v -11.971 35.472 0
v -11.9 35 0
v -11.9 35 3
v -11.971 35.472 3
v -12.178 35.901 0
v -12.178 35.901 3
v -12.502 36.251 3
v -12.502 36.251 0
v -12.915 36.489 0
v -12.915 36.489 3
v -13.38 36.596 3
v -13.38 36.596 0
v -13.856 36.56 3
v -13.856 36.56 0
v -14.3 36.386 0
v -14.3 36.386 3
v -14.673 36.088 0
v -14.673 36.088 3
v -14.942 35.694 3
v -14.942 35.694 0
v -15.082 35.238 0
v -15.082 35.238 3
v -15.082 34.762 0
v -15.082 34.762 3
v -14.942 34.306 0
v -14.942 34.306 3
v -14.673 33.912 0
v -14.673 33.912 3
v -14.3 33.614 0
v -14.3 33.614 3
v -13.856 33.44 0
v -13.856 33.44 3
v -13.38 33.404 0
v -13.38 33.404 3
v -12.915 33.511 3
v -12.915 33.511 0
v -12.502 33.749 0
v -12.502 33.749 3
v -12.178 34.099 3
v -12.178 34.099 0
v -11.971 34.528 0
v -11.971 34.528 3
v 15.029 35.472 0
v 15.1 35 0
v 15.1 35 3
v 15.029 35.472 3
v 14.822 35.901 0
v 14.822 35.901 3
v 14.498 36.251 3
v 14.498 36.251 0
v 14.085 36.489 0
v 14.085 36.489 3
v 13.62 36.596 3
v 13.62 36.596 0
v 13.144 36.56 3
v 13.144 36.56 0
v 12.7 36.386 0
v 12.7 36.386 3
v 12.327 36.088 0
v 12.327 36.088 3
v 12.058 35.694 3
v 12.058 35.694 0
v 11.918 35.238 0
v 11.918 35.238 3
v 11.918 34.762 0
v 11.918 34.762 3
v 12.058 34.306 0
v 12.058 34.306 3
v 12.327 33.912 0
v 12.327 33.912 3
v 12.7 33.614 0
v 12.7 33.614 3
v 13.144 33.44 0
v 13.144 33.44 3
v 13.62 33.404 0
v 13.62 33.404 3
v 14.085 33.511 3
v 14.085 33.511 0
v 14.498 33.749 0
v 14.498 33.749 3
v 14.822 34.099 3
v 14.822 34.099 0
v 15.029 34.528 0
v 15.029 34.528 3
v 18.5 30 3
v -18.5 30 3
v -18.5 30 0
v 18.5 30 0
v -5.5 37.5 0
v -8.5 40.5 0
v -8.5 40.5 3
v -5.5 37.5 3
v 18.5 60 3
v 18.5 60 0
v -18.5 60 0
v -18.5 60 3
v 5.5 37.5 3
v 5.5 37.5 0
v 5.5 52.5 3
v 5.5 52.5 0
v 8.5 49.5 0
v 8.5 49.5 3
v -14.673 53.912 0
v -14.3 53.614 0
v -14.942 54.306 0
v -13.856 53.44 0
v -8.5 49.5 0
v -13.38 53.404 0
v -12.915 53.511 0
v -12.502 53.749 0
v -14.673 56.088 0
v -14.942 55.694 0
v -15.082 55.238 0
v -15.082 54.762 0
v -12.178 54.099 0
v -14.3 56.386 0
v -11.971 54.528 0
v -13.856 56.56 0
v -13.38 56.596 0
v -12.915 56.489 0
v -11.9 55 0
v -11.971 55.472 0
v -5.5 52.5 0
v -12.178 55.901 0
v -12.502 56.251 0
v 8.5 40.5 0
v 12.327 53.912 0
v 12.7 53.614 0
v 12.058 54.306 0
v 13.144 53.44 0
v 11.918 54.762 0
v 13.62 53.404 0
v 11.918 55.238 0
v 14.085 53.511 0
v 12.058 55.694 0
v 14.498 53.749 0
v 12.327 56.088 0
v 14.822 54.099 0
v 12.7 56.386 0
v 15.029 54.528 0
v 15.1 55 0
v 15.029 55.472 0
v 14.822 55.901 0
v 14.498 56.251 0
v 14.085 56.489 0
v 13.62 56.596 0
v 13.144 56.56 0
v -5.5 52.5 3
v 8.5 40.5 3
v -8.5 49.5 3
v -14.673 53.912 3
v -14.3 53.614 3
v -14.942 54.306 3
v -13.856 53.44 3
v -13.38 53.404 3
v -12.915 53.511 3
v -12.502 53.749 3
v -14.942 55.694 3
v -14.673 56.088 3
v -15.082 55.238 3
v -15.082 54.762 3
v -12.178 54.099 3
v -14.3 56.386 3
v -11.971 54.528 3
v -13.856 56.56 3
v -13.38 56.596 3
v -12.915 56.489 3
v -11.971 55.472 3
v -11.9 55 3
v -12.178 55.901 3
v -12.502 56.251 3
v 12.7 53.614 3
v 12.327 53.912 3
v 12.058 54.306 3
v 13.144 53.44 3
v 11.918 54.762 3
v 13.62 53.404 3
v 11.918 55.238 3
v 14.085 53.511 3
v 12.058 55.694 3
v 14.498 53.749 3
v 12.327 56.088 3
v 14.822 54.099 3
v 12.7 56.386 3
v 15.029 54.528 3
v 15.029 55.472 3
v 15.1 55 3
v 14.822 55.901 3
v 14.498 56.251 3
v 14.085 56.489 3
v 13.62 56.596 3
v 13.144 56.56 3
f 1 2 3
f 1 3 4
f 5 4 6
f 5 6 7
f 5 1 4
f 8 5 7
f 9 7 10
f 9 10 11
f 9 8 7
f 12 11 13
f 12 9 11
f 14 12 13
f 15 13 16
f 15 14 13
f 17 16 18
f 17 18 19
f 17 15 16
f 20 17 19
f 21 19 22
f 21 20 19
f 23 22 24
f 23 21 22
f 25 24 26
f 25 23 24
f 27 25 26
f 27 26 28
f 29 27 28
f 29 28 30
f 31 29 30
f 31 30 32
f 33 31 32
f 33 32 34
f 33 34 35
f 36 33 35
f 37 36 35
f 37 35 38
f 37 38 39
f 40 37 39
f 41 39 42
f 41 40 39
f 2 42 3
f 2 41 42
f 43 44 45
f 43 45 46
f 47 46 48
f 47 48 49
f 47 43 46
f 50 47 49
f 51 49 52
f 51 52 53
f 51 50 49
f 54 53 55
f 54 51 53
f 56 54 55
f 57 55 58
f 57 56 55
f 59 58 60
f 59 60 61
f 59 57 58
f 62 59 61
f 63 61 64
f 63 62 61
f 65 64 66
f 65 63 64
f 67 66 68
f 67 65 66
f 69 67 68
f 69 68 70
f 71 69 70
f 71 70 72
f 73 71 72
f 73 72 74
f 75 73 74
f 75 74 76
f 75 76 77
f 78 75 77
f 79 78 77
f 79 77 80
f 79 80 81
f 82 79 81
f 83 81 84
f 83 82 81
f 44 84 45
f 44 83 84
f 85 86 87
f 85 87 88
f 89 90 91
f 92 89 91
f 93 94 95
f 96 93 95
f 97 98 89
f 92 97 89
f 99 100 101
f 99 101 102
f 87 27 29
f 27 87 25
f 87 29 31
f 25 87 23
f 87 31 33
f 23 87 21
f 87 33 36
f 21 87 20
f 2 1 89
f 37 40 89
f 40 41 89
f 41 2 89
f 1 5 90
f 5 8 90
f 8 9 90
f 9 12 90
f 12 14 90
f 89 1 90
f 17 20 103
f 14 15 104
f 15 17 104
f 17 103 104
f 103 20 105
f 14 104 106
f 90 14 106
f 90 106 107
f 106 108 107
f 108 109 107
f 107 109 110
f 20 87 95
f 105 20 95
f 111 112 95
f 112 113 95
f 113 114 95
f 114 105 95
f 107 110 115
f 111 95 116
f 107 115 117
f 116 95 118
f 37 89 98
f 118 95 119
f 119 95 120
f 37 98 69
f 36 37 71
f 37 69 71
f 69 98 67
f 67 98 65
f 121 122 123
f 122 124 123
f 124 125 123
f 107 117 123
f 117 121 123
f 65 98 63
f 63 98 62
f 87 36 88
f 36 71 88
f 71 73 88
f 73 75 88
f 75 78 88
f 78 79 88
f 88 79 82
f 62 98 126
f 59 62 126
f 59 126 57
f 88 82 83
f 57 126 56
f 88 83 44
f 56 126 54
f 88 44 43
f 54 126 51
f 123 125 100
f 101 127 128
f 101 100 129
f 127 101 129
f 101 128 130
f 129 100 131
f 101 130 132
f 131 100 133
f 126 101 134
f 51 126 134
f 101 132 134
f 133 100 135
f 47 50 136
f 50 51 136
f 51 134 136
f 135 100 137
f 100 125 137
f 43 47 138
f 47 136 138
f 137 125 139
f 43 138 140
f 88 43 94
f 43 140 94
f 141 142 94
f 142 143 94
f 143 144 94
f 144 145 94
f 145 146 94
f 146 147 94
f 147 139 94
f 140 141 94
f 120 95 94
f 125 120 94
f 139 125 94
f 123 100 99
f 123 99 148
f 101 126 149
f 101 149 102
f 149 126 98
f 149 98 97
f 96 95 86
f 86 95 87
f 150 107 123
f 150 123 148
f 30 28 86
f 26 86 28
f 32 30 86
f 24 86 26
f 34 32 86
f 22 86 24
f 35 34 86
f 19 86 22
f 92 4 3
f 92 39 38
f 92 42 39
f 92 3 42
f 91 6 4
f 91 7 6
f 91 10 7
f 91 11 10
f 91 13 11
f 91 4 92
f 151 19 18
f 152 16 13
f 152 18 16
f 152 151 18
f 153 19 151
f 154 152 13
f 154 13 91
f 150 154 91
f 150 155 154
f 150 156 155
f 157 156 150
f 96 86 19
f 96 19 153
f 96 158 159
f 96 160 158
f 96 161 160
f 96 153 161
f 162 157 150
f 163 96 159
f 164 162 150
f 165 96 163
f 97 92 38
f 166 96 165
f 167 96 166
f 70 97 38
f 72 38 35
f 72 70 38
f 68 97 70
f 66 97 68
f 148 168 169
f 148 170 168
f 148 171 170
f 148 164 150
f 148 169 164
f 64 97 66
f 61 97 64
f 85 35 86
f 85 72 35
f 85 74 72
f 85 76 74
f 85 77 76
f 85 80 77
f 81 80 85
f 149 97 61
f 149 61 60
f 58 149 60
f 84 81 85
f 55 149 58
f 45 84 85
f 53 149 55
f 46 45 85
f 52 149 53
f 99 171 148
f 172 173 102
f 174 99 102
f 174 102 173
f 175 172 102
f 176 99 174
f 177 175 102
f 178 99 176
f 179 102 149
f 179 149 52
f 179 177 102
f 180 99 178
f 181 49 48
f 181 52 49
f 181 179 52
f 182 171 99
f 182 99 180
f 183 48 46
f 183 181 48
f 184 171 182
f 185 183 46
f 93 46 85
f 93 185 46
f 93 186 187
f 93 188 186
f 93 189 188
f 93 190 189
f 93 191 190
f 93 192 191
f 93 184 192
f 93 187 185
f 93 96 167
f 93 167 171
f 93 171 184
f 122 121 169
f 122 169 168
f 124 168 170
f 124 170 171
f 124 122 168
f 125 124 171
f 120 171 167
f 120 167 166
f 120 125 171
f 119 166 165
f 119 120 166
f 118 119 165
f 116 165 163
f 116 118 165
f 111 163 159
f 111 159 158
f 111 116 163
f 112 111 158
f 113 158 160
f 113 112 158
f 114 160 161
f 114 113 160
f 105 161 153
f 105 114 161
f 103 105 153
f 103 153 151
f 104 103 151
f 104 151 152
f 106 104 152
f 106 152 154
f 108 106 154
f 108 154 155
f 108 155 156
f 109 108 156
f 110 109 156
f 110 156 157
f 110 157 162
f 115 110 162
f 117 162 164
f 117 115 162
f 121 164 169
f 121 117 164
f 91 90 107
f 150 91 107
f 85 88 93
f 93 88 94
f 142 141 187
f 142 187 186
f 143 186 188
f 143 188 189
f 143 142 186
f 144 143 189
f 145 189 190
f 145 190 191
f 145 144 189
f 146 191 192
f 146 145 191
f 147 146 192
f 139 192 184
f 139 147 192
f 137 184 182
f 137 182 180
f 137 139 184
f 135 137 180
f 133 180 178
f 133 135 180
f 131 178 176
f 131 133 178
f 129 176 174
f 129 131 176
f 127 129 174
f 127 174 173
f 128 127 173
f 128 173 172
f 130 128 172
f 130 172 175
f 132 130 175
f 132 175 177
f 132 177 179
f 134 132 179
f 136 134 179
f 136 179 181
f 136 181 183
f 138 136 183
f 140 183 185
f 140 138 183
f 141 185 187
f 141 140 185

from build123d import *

# Parameters (mm, degrees)
SKETCH_1_W          = 37
SKETCH_1_H          = 120
SKETCH_1_R          = 1.6
SKETCH_1_R_2        = 3
EXTRUDE_1_DEPTH     = 3
SKETCH_2_W          = 37
SKETCH_2_H          = 90
CUT_EXTRUDE_1_DEPTH = 3
SKETCH_3_W          = 17
SKETCH_3_H          = 15
CUT_EXTRUDE_2_DEPTH = 63.858969129
CHAMFER_1_SIZE      = 3


with BuildPart() as part:
    # ｽｹｯﾁ1 → ﾎﾞｽ - 押し出し1 (new body)
    # profile 1 of 2: a face of its own
    with BuildSketch(Plane.XY):
        Rectangle(SKETCH_1_W, SKETCH_1_H)
        with Locations((13.5, -55)):
            Circle(SKETCH_1_R, mode=Mode.SUBTRACT)
        with Locations((13.5, -35)):
            Circle(SKETCH_1_R_2, mode=Mode.SUBTRACT)
        with Locations((-13.5, -55)):
            Circle(SKETCH_1_R, mode=Mode.SUBTRACT)
        with Locations((-13.5, -35)):
            Circle(SKETCH_1_R_2, mode=Mode.SUBTRACT)
        with Locations((13.5, 35)):
            Circle(SKETCH_1_R, mode=Mode.SUBTRACT)
        with Locations((13.5, 55)):
            Circle(SKETCH_1_R, mode=Mode.SUBTRACT)
        with Locations((-13.5, 35)):
            Circle(SKETCH_1_R, mode=Mode.SUBTRACT)
        with Locations((-13.5, 55)):
            Circle(SKETCH_1_R, mode=Mode.SUBTRACT)
    # profile 2 of 2: a face of its own
    with BuildSketch(Plane.XY):
        Polygon((-18.5, -25), (-18.5, -60), (18.5, -60), (18.5, 60), (-18.5, 60), (-18.5, 25), align=None)
        with Locations((-13.5, -55)):
            Circle(SKETCH_1_R, mode=Mode.SUBTRACT)
        with Locations((-13.5, -35)):
            Circle(SKETCH_1_R_2, mode=Mode.SUBTRACT)
        with Locations((13.5, -55)):
            Circle(SKETCH_1_R, mode=Mode.SUBTRACT)
        with Locations((13.5, -35)):
            Circle(SKETCH_1_R_2, mode=Mode.SUBTRACT)
        with Locations((-13.5, 35)):
            Circle(SKETCH_1_R, mode=Mode.SUBTRACT)
        with Locations((-13.5, 55)):
            Circle(SKETCH_1_R, mode=Mode.SUBTRACT)
        with Locations((13.5, 35)):
            Circle(SKETCH_1_R, mode=Mode.SUBTRACT)
        with Locations((13.5, 55)):
            Circle(SKETCH_1_R, mode=Mode.SUBTRACT)
    extrude(amount=EXTRUDE_1_DEPTH)

    # ｽｹｯﾁ2 → ｶｯﾄ - 押し出し1 (cut)
    with BuildSketch(Plane.XY.offset(3)):
        with Locations((0, -15)):
            Rectangle(SKETCH_2_W, SKETCH_2_H)
    extrude(amount=-CUT_EXTRUDE_1_DEPTH, mode=Mode.SUBTRACT)

    # ｽｹｯﾁ3 → ｶｯﾄ - 押し出し2 (cut, through all)
    with BuildSketch(Plane(origin=(0, 0, 0), x_dir=(-1, 0, 0), z_dir=(0, 0, -1))):
        with Locations((0, 45)):
            Rectangle(SKETCH_3_W, SKETCH_3_H)
    extrude(amount=-CUT_EXTRUDE_2_DEPTH, mode=Mode.SUBTRACT)

    # 面取り1
    chamfer_1_edges = [part.edges().sort_by_distance(p)[0] for p in [
        (8.5, 37.5, 1.5),
        (8.5, 52.5, 1.5),
        (-8.5, 52.5, 1.5),
        (-8.5, 37.5, 1.5),
    ]]
    chamfer(chamfer_1_edges, length=CHAMFER_1_SIZE)


solid = part.part
